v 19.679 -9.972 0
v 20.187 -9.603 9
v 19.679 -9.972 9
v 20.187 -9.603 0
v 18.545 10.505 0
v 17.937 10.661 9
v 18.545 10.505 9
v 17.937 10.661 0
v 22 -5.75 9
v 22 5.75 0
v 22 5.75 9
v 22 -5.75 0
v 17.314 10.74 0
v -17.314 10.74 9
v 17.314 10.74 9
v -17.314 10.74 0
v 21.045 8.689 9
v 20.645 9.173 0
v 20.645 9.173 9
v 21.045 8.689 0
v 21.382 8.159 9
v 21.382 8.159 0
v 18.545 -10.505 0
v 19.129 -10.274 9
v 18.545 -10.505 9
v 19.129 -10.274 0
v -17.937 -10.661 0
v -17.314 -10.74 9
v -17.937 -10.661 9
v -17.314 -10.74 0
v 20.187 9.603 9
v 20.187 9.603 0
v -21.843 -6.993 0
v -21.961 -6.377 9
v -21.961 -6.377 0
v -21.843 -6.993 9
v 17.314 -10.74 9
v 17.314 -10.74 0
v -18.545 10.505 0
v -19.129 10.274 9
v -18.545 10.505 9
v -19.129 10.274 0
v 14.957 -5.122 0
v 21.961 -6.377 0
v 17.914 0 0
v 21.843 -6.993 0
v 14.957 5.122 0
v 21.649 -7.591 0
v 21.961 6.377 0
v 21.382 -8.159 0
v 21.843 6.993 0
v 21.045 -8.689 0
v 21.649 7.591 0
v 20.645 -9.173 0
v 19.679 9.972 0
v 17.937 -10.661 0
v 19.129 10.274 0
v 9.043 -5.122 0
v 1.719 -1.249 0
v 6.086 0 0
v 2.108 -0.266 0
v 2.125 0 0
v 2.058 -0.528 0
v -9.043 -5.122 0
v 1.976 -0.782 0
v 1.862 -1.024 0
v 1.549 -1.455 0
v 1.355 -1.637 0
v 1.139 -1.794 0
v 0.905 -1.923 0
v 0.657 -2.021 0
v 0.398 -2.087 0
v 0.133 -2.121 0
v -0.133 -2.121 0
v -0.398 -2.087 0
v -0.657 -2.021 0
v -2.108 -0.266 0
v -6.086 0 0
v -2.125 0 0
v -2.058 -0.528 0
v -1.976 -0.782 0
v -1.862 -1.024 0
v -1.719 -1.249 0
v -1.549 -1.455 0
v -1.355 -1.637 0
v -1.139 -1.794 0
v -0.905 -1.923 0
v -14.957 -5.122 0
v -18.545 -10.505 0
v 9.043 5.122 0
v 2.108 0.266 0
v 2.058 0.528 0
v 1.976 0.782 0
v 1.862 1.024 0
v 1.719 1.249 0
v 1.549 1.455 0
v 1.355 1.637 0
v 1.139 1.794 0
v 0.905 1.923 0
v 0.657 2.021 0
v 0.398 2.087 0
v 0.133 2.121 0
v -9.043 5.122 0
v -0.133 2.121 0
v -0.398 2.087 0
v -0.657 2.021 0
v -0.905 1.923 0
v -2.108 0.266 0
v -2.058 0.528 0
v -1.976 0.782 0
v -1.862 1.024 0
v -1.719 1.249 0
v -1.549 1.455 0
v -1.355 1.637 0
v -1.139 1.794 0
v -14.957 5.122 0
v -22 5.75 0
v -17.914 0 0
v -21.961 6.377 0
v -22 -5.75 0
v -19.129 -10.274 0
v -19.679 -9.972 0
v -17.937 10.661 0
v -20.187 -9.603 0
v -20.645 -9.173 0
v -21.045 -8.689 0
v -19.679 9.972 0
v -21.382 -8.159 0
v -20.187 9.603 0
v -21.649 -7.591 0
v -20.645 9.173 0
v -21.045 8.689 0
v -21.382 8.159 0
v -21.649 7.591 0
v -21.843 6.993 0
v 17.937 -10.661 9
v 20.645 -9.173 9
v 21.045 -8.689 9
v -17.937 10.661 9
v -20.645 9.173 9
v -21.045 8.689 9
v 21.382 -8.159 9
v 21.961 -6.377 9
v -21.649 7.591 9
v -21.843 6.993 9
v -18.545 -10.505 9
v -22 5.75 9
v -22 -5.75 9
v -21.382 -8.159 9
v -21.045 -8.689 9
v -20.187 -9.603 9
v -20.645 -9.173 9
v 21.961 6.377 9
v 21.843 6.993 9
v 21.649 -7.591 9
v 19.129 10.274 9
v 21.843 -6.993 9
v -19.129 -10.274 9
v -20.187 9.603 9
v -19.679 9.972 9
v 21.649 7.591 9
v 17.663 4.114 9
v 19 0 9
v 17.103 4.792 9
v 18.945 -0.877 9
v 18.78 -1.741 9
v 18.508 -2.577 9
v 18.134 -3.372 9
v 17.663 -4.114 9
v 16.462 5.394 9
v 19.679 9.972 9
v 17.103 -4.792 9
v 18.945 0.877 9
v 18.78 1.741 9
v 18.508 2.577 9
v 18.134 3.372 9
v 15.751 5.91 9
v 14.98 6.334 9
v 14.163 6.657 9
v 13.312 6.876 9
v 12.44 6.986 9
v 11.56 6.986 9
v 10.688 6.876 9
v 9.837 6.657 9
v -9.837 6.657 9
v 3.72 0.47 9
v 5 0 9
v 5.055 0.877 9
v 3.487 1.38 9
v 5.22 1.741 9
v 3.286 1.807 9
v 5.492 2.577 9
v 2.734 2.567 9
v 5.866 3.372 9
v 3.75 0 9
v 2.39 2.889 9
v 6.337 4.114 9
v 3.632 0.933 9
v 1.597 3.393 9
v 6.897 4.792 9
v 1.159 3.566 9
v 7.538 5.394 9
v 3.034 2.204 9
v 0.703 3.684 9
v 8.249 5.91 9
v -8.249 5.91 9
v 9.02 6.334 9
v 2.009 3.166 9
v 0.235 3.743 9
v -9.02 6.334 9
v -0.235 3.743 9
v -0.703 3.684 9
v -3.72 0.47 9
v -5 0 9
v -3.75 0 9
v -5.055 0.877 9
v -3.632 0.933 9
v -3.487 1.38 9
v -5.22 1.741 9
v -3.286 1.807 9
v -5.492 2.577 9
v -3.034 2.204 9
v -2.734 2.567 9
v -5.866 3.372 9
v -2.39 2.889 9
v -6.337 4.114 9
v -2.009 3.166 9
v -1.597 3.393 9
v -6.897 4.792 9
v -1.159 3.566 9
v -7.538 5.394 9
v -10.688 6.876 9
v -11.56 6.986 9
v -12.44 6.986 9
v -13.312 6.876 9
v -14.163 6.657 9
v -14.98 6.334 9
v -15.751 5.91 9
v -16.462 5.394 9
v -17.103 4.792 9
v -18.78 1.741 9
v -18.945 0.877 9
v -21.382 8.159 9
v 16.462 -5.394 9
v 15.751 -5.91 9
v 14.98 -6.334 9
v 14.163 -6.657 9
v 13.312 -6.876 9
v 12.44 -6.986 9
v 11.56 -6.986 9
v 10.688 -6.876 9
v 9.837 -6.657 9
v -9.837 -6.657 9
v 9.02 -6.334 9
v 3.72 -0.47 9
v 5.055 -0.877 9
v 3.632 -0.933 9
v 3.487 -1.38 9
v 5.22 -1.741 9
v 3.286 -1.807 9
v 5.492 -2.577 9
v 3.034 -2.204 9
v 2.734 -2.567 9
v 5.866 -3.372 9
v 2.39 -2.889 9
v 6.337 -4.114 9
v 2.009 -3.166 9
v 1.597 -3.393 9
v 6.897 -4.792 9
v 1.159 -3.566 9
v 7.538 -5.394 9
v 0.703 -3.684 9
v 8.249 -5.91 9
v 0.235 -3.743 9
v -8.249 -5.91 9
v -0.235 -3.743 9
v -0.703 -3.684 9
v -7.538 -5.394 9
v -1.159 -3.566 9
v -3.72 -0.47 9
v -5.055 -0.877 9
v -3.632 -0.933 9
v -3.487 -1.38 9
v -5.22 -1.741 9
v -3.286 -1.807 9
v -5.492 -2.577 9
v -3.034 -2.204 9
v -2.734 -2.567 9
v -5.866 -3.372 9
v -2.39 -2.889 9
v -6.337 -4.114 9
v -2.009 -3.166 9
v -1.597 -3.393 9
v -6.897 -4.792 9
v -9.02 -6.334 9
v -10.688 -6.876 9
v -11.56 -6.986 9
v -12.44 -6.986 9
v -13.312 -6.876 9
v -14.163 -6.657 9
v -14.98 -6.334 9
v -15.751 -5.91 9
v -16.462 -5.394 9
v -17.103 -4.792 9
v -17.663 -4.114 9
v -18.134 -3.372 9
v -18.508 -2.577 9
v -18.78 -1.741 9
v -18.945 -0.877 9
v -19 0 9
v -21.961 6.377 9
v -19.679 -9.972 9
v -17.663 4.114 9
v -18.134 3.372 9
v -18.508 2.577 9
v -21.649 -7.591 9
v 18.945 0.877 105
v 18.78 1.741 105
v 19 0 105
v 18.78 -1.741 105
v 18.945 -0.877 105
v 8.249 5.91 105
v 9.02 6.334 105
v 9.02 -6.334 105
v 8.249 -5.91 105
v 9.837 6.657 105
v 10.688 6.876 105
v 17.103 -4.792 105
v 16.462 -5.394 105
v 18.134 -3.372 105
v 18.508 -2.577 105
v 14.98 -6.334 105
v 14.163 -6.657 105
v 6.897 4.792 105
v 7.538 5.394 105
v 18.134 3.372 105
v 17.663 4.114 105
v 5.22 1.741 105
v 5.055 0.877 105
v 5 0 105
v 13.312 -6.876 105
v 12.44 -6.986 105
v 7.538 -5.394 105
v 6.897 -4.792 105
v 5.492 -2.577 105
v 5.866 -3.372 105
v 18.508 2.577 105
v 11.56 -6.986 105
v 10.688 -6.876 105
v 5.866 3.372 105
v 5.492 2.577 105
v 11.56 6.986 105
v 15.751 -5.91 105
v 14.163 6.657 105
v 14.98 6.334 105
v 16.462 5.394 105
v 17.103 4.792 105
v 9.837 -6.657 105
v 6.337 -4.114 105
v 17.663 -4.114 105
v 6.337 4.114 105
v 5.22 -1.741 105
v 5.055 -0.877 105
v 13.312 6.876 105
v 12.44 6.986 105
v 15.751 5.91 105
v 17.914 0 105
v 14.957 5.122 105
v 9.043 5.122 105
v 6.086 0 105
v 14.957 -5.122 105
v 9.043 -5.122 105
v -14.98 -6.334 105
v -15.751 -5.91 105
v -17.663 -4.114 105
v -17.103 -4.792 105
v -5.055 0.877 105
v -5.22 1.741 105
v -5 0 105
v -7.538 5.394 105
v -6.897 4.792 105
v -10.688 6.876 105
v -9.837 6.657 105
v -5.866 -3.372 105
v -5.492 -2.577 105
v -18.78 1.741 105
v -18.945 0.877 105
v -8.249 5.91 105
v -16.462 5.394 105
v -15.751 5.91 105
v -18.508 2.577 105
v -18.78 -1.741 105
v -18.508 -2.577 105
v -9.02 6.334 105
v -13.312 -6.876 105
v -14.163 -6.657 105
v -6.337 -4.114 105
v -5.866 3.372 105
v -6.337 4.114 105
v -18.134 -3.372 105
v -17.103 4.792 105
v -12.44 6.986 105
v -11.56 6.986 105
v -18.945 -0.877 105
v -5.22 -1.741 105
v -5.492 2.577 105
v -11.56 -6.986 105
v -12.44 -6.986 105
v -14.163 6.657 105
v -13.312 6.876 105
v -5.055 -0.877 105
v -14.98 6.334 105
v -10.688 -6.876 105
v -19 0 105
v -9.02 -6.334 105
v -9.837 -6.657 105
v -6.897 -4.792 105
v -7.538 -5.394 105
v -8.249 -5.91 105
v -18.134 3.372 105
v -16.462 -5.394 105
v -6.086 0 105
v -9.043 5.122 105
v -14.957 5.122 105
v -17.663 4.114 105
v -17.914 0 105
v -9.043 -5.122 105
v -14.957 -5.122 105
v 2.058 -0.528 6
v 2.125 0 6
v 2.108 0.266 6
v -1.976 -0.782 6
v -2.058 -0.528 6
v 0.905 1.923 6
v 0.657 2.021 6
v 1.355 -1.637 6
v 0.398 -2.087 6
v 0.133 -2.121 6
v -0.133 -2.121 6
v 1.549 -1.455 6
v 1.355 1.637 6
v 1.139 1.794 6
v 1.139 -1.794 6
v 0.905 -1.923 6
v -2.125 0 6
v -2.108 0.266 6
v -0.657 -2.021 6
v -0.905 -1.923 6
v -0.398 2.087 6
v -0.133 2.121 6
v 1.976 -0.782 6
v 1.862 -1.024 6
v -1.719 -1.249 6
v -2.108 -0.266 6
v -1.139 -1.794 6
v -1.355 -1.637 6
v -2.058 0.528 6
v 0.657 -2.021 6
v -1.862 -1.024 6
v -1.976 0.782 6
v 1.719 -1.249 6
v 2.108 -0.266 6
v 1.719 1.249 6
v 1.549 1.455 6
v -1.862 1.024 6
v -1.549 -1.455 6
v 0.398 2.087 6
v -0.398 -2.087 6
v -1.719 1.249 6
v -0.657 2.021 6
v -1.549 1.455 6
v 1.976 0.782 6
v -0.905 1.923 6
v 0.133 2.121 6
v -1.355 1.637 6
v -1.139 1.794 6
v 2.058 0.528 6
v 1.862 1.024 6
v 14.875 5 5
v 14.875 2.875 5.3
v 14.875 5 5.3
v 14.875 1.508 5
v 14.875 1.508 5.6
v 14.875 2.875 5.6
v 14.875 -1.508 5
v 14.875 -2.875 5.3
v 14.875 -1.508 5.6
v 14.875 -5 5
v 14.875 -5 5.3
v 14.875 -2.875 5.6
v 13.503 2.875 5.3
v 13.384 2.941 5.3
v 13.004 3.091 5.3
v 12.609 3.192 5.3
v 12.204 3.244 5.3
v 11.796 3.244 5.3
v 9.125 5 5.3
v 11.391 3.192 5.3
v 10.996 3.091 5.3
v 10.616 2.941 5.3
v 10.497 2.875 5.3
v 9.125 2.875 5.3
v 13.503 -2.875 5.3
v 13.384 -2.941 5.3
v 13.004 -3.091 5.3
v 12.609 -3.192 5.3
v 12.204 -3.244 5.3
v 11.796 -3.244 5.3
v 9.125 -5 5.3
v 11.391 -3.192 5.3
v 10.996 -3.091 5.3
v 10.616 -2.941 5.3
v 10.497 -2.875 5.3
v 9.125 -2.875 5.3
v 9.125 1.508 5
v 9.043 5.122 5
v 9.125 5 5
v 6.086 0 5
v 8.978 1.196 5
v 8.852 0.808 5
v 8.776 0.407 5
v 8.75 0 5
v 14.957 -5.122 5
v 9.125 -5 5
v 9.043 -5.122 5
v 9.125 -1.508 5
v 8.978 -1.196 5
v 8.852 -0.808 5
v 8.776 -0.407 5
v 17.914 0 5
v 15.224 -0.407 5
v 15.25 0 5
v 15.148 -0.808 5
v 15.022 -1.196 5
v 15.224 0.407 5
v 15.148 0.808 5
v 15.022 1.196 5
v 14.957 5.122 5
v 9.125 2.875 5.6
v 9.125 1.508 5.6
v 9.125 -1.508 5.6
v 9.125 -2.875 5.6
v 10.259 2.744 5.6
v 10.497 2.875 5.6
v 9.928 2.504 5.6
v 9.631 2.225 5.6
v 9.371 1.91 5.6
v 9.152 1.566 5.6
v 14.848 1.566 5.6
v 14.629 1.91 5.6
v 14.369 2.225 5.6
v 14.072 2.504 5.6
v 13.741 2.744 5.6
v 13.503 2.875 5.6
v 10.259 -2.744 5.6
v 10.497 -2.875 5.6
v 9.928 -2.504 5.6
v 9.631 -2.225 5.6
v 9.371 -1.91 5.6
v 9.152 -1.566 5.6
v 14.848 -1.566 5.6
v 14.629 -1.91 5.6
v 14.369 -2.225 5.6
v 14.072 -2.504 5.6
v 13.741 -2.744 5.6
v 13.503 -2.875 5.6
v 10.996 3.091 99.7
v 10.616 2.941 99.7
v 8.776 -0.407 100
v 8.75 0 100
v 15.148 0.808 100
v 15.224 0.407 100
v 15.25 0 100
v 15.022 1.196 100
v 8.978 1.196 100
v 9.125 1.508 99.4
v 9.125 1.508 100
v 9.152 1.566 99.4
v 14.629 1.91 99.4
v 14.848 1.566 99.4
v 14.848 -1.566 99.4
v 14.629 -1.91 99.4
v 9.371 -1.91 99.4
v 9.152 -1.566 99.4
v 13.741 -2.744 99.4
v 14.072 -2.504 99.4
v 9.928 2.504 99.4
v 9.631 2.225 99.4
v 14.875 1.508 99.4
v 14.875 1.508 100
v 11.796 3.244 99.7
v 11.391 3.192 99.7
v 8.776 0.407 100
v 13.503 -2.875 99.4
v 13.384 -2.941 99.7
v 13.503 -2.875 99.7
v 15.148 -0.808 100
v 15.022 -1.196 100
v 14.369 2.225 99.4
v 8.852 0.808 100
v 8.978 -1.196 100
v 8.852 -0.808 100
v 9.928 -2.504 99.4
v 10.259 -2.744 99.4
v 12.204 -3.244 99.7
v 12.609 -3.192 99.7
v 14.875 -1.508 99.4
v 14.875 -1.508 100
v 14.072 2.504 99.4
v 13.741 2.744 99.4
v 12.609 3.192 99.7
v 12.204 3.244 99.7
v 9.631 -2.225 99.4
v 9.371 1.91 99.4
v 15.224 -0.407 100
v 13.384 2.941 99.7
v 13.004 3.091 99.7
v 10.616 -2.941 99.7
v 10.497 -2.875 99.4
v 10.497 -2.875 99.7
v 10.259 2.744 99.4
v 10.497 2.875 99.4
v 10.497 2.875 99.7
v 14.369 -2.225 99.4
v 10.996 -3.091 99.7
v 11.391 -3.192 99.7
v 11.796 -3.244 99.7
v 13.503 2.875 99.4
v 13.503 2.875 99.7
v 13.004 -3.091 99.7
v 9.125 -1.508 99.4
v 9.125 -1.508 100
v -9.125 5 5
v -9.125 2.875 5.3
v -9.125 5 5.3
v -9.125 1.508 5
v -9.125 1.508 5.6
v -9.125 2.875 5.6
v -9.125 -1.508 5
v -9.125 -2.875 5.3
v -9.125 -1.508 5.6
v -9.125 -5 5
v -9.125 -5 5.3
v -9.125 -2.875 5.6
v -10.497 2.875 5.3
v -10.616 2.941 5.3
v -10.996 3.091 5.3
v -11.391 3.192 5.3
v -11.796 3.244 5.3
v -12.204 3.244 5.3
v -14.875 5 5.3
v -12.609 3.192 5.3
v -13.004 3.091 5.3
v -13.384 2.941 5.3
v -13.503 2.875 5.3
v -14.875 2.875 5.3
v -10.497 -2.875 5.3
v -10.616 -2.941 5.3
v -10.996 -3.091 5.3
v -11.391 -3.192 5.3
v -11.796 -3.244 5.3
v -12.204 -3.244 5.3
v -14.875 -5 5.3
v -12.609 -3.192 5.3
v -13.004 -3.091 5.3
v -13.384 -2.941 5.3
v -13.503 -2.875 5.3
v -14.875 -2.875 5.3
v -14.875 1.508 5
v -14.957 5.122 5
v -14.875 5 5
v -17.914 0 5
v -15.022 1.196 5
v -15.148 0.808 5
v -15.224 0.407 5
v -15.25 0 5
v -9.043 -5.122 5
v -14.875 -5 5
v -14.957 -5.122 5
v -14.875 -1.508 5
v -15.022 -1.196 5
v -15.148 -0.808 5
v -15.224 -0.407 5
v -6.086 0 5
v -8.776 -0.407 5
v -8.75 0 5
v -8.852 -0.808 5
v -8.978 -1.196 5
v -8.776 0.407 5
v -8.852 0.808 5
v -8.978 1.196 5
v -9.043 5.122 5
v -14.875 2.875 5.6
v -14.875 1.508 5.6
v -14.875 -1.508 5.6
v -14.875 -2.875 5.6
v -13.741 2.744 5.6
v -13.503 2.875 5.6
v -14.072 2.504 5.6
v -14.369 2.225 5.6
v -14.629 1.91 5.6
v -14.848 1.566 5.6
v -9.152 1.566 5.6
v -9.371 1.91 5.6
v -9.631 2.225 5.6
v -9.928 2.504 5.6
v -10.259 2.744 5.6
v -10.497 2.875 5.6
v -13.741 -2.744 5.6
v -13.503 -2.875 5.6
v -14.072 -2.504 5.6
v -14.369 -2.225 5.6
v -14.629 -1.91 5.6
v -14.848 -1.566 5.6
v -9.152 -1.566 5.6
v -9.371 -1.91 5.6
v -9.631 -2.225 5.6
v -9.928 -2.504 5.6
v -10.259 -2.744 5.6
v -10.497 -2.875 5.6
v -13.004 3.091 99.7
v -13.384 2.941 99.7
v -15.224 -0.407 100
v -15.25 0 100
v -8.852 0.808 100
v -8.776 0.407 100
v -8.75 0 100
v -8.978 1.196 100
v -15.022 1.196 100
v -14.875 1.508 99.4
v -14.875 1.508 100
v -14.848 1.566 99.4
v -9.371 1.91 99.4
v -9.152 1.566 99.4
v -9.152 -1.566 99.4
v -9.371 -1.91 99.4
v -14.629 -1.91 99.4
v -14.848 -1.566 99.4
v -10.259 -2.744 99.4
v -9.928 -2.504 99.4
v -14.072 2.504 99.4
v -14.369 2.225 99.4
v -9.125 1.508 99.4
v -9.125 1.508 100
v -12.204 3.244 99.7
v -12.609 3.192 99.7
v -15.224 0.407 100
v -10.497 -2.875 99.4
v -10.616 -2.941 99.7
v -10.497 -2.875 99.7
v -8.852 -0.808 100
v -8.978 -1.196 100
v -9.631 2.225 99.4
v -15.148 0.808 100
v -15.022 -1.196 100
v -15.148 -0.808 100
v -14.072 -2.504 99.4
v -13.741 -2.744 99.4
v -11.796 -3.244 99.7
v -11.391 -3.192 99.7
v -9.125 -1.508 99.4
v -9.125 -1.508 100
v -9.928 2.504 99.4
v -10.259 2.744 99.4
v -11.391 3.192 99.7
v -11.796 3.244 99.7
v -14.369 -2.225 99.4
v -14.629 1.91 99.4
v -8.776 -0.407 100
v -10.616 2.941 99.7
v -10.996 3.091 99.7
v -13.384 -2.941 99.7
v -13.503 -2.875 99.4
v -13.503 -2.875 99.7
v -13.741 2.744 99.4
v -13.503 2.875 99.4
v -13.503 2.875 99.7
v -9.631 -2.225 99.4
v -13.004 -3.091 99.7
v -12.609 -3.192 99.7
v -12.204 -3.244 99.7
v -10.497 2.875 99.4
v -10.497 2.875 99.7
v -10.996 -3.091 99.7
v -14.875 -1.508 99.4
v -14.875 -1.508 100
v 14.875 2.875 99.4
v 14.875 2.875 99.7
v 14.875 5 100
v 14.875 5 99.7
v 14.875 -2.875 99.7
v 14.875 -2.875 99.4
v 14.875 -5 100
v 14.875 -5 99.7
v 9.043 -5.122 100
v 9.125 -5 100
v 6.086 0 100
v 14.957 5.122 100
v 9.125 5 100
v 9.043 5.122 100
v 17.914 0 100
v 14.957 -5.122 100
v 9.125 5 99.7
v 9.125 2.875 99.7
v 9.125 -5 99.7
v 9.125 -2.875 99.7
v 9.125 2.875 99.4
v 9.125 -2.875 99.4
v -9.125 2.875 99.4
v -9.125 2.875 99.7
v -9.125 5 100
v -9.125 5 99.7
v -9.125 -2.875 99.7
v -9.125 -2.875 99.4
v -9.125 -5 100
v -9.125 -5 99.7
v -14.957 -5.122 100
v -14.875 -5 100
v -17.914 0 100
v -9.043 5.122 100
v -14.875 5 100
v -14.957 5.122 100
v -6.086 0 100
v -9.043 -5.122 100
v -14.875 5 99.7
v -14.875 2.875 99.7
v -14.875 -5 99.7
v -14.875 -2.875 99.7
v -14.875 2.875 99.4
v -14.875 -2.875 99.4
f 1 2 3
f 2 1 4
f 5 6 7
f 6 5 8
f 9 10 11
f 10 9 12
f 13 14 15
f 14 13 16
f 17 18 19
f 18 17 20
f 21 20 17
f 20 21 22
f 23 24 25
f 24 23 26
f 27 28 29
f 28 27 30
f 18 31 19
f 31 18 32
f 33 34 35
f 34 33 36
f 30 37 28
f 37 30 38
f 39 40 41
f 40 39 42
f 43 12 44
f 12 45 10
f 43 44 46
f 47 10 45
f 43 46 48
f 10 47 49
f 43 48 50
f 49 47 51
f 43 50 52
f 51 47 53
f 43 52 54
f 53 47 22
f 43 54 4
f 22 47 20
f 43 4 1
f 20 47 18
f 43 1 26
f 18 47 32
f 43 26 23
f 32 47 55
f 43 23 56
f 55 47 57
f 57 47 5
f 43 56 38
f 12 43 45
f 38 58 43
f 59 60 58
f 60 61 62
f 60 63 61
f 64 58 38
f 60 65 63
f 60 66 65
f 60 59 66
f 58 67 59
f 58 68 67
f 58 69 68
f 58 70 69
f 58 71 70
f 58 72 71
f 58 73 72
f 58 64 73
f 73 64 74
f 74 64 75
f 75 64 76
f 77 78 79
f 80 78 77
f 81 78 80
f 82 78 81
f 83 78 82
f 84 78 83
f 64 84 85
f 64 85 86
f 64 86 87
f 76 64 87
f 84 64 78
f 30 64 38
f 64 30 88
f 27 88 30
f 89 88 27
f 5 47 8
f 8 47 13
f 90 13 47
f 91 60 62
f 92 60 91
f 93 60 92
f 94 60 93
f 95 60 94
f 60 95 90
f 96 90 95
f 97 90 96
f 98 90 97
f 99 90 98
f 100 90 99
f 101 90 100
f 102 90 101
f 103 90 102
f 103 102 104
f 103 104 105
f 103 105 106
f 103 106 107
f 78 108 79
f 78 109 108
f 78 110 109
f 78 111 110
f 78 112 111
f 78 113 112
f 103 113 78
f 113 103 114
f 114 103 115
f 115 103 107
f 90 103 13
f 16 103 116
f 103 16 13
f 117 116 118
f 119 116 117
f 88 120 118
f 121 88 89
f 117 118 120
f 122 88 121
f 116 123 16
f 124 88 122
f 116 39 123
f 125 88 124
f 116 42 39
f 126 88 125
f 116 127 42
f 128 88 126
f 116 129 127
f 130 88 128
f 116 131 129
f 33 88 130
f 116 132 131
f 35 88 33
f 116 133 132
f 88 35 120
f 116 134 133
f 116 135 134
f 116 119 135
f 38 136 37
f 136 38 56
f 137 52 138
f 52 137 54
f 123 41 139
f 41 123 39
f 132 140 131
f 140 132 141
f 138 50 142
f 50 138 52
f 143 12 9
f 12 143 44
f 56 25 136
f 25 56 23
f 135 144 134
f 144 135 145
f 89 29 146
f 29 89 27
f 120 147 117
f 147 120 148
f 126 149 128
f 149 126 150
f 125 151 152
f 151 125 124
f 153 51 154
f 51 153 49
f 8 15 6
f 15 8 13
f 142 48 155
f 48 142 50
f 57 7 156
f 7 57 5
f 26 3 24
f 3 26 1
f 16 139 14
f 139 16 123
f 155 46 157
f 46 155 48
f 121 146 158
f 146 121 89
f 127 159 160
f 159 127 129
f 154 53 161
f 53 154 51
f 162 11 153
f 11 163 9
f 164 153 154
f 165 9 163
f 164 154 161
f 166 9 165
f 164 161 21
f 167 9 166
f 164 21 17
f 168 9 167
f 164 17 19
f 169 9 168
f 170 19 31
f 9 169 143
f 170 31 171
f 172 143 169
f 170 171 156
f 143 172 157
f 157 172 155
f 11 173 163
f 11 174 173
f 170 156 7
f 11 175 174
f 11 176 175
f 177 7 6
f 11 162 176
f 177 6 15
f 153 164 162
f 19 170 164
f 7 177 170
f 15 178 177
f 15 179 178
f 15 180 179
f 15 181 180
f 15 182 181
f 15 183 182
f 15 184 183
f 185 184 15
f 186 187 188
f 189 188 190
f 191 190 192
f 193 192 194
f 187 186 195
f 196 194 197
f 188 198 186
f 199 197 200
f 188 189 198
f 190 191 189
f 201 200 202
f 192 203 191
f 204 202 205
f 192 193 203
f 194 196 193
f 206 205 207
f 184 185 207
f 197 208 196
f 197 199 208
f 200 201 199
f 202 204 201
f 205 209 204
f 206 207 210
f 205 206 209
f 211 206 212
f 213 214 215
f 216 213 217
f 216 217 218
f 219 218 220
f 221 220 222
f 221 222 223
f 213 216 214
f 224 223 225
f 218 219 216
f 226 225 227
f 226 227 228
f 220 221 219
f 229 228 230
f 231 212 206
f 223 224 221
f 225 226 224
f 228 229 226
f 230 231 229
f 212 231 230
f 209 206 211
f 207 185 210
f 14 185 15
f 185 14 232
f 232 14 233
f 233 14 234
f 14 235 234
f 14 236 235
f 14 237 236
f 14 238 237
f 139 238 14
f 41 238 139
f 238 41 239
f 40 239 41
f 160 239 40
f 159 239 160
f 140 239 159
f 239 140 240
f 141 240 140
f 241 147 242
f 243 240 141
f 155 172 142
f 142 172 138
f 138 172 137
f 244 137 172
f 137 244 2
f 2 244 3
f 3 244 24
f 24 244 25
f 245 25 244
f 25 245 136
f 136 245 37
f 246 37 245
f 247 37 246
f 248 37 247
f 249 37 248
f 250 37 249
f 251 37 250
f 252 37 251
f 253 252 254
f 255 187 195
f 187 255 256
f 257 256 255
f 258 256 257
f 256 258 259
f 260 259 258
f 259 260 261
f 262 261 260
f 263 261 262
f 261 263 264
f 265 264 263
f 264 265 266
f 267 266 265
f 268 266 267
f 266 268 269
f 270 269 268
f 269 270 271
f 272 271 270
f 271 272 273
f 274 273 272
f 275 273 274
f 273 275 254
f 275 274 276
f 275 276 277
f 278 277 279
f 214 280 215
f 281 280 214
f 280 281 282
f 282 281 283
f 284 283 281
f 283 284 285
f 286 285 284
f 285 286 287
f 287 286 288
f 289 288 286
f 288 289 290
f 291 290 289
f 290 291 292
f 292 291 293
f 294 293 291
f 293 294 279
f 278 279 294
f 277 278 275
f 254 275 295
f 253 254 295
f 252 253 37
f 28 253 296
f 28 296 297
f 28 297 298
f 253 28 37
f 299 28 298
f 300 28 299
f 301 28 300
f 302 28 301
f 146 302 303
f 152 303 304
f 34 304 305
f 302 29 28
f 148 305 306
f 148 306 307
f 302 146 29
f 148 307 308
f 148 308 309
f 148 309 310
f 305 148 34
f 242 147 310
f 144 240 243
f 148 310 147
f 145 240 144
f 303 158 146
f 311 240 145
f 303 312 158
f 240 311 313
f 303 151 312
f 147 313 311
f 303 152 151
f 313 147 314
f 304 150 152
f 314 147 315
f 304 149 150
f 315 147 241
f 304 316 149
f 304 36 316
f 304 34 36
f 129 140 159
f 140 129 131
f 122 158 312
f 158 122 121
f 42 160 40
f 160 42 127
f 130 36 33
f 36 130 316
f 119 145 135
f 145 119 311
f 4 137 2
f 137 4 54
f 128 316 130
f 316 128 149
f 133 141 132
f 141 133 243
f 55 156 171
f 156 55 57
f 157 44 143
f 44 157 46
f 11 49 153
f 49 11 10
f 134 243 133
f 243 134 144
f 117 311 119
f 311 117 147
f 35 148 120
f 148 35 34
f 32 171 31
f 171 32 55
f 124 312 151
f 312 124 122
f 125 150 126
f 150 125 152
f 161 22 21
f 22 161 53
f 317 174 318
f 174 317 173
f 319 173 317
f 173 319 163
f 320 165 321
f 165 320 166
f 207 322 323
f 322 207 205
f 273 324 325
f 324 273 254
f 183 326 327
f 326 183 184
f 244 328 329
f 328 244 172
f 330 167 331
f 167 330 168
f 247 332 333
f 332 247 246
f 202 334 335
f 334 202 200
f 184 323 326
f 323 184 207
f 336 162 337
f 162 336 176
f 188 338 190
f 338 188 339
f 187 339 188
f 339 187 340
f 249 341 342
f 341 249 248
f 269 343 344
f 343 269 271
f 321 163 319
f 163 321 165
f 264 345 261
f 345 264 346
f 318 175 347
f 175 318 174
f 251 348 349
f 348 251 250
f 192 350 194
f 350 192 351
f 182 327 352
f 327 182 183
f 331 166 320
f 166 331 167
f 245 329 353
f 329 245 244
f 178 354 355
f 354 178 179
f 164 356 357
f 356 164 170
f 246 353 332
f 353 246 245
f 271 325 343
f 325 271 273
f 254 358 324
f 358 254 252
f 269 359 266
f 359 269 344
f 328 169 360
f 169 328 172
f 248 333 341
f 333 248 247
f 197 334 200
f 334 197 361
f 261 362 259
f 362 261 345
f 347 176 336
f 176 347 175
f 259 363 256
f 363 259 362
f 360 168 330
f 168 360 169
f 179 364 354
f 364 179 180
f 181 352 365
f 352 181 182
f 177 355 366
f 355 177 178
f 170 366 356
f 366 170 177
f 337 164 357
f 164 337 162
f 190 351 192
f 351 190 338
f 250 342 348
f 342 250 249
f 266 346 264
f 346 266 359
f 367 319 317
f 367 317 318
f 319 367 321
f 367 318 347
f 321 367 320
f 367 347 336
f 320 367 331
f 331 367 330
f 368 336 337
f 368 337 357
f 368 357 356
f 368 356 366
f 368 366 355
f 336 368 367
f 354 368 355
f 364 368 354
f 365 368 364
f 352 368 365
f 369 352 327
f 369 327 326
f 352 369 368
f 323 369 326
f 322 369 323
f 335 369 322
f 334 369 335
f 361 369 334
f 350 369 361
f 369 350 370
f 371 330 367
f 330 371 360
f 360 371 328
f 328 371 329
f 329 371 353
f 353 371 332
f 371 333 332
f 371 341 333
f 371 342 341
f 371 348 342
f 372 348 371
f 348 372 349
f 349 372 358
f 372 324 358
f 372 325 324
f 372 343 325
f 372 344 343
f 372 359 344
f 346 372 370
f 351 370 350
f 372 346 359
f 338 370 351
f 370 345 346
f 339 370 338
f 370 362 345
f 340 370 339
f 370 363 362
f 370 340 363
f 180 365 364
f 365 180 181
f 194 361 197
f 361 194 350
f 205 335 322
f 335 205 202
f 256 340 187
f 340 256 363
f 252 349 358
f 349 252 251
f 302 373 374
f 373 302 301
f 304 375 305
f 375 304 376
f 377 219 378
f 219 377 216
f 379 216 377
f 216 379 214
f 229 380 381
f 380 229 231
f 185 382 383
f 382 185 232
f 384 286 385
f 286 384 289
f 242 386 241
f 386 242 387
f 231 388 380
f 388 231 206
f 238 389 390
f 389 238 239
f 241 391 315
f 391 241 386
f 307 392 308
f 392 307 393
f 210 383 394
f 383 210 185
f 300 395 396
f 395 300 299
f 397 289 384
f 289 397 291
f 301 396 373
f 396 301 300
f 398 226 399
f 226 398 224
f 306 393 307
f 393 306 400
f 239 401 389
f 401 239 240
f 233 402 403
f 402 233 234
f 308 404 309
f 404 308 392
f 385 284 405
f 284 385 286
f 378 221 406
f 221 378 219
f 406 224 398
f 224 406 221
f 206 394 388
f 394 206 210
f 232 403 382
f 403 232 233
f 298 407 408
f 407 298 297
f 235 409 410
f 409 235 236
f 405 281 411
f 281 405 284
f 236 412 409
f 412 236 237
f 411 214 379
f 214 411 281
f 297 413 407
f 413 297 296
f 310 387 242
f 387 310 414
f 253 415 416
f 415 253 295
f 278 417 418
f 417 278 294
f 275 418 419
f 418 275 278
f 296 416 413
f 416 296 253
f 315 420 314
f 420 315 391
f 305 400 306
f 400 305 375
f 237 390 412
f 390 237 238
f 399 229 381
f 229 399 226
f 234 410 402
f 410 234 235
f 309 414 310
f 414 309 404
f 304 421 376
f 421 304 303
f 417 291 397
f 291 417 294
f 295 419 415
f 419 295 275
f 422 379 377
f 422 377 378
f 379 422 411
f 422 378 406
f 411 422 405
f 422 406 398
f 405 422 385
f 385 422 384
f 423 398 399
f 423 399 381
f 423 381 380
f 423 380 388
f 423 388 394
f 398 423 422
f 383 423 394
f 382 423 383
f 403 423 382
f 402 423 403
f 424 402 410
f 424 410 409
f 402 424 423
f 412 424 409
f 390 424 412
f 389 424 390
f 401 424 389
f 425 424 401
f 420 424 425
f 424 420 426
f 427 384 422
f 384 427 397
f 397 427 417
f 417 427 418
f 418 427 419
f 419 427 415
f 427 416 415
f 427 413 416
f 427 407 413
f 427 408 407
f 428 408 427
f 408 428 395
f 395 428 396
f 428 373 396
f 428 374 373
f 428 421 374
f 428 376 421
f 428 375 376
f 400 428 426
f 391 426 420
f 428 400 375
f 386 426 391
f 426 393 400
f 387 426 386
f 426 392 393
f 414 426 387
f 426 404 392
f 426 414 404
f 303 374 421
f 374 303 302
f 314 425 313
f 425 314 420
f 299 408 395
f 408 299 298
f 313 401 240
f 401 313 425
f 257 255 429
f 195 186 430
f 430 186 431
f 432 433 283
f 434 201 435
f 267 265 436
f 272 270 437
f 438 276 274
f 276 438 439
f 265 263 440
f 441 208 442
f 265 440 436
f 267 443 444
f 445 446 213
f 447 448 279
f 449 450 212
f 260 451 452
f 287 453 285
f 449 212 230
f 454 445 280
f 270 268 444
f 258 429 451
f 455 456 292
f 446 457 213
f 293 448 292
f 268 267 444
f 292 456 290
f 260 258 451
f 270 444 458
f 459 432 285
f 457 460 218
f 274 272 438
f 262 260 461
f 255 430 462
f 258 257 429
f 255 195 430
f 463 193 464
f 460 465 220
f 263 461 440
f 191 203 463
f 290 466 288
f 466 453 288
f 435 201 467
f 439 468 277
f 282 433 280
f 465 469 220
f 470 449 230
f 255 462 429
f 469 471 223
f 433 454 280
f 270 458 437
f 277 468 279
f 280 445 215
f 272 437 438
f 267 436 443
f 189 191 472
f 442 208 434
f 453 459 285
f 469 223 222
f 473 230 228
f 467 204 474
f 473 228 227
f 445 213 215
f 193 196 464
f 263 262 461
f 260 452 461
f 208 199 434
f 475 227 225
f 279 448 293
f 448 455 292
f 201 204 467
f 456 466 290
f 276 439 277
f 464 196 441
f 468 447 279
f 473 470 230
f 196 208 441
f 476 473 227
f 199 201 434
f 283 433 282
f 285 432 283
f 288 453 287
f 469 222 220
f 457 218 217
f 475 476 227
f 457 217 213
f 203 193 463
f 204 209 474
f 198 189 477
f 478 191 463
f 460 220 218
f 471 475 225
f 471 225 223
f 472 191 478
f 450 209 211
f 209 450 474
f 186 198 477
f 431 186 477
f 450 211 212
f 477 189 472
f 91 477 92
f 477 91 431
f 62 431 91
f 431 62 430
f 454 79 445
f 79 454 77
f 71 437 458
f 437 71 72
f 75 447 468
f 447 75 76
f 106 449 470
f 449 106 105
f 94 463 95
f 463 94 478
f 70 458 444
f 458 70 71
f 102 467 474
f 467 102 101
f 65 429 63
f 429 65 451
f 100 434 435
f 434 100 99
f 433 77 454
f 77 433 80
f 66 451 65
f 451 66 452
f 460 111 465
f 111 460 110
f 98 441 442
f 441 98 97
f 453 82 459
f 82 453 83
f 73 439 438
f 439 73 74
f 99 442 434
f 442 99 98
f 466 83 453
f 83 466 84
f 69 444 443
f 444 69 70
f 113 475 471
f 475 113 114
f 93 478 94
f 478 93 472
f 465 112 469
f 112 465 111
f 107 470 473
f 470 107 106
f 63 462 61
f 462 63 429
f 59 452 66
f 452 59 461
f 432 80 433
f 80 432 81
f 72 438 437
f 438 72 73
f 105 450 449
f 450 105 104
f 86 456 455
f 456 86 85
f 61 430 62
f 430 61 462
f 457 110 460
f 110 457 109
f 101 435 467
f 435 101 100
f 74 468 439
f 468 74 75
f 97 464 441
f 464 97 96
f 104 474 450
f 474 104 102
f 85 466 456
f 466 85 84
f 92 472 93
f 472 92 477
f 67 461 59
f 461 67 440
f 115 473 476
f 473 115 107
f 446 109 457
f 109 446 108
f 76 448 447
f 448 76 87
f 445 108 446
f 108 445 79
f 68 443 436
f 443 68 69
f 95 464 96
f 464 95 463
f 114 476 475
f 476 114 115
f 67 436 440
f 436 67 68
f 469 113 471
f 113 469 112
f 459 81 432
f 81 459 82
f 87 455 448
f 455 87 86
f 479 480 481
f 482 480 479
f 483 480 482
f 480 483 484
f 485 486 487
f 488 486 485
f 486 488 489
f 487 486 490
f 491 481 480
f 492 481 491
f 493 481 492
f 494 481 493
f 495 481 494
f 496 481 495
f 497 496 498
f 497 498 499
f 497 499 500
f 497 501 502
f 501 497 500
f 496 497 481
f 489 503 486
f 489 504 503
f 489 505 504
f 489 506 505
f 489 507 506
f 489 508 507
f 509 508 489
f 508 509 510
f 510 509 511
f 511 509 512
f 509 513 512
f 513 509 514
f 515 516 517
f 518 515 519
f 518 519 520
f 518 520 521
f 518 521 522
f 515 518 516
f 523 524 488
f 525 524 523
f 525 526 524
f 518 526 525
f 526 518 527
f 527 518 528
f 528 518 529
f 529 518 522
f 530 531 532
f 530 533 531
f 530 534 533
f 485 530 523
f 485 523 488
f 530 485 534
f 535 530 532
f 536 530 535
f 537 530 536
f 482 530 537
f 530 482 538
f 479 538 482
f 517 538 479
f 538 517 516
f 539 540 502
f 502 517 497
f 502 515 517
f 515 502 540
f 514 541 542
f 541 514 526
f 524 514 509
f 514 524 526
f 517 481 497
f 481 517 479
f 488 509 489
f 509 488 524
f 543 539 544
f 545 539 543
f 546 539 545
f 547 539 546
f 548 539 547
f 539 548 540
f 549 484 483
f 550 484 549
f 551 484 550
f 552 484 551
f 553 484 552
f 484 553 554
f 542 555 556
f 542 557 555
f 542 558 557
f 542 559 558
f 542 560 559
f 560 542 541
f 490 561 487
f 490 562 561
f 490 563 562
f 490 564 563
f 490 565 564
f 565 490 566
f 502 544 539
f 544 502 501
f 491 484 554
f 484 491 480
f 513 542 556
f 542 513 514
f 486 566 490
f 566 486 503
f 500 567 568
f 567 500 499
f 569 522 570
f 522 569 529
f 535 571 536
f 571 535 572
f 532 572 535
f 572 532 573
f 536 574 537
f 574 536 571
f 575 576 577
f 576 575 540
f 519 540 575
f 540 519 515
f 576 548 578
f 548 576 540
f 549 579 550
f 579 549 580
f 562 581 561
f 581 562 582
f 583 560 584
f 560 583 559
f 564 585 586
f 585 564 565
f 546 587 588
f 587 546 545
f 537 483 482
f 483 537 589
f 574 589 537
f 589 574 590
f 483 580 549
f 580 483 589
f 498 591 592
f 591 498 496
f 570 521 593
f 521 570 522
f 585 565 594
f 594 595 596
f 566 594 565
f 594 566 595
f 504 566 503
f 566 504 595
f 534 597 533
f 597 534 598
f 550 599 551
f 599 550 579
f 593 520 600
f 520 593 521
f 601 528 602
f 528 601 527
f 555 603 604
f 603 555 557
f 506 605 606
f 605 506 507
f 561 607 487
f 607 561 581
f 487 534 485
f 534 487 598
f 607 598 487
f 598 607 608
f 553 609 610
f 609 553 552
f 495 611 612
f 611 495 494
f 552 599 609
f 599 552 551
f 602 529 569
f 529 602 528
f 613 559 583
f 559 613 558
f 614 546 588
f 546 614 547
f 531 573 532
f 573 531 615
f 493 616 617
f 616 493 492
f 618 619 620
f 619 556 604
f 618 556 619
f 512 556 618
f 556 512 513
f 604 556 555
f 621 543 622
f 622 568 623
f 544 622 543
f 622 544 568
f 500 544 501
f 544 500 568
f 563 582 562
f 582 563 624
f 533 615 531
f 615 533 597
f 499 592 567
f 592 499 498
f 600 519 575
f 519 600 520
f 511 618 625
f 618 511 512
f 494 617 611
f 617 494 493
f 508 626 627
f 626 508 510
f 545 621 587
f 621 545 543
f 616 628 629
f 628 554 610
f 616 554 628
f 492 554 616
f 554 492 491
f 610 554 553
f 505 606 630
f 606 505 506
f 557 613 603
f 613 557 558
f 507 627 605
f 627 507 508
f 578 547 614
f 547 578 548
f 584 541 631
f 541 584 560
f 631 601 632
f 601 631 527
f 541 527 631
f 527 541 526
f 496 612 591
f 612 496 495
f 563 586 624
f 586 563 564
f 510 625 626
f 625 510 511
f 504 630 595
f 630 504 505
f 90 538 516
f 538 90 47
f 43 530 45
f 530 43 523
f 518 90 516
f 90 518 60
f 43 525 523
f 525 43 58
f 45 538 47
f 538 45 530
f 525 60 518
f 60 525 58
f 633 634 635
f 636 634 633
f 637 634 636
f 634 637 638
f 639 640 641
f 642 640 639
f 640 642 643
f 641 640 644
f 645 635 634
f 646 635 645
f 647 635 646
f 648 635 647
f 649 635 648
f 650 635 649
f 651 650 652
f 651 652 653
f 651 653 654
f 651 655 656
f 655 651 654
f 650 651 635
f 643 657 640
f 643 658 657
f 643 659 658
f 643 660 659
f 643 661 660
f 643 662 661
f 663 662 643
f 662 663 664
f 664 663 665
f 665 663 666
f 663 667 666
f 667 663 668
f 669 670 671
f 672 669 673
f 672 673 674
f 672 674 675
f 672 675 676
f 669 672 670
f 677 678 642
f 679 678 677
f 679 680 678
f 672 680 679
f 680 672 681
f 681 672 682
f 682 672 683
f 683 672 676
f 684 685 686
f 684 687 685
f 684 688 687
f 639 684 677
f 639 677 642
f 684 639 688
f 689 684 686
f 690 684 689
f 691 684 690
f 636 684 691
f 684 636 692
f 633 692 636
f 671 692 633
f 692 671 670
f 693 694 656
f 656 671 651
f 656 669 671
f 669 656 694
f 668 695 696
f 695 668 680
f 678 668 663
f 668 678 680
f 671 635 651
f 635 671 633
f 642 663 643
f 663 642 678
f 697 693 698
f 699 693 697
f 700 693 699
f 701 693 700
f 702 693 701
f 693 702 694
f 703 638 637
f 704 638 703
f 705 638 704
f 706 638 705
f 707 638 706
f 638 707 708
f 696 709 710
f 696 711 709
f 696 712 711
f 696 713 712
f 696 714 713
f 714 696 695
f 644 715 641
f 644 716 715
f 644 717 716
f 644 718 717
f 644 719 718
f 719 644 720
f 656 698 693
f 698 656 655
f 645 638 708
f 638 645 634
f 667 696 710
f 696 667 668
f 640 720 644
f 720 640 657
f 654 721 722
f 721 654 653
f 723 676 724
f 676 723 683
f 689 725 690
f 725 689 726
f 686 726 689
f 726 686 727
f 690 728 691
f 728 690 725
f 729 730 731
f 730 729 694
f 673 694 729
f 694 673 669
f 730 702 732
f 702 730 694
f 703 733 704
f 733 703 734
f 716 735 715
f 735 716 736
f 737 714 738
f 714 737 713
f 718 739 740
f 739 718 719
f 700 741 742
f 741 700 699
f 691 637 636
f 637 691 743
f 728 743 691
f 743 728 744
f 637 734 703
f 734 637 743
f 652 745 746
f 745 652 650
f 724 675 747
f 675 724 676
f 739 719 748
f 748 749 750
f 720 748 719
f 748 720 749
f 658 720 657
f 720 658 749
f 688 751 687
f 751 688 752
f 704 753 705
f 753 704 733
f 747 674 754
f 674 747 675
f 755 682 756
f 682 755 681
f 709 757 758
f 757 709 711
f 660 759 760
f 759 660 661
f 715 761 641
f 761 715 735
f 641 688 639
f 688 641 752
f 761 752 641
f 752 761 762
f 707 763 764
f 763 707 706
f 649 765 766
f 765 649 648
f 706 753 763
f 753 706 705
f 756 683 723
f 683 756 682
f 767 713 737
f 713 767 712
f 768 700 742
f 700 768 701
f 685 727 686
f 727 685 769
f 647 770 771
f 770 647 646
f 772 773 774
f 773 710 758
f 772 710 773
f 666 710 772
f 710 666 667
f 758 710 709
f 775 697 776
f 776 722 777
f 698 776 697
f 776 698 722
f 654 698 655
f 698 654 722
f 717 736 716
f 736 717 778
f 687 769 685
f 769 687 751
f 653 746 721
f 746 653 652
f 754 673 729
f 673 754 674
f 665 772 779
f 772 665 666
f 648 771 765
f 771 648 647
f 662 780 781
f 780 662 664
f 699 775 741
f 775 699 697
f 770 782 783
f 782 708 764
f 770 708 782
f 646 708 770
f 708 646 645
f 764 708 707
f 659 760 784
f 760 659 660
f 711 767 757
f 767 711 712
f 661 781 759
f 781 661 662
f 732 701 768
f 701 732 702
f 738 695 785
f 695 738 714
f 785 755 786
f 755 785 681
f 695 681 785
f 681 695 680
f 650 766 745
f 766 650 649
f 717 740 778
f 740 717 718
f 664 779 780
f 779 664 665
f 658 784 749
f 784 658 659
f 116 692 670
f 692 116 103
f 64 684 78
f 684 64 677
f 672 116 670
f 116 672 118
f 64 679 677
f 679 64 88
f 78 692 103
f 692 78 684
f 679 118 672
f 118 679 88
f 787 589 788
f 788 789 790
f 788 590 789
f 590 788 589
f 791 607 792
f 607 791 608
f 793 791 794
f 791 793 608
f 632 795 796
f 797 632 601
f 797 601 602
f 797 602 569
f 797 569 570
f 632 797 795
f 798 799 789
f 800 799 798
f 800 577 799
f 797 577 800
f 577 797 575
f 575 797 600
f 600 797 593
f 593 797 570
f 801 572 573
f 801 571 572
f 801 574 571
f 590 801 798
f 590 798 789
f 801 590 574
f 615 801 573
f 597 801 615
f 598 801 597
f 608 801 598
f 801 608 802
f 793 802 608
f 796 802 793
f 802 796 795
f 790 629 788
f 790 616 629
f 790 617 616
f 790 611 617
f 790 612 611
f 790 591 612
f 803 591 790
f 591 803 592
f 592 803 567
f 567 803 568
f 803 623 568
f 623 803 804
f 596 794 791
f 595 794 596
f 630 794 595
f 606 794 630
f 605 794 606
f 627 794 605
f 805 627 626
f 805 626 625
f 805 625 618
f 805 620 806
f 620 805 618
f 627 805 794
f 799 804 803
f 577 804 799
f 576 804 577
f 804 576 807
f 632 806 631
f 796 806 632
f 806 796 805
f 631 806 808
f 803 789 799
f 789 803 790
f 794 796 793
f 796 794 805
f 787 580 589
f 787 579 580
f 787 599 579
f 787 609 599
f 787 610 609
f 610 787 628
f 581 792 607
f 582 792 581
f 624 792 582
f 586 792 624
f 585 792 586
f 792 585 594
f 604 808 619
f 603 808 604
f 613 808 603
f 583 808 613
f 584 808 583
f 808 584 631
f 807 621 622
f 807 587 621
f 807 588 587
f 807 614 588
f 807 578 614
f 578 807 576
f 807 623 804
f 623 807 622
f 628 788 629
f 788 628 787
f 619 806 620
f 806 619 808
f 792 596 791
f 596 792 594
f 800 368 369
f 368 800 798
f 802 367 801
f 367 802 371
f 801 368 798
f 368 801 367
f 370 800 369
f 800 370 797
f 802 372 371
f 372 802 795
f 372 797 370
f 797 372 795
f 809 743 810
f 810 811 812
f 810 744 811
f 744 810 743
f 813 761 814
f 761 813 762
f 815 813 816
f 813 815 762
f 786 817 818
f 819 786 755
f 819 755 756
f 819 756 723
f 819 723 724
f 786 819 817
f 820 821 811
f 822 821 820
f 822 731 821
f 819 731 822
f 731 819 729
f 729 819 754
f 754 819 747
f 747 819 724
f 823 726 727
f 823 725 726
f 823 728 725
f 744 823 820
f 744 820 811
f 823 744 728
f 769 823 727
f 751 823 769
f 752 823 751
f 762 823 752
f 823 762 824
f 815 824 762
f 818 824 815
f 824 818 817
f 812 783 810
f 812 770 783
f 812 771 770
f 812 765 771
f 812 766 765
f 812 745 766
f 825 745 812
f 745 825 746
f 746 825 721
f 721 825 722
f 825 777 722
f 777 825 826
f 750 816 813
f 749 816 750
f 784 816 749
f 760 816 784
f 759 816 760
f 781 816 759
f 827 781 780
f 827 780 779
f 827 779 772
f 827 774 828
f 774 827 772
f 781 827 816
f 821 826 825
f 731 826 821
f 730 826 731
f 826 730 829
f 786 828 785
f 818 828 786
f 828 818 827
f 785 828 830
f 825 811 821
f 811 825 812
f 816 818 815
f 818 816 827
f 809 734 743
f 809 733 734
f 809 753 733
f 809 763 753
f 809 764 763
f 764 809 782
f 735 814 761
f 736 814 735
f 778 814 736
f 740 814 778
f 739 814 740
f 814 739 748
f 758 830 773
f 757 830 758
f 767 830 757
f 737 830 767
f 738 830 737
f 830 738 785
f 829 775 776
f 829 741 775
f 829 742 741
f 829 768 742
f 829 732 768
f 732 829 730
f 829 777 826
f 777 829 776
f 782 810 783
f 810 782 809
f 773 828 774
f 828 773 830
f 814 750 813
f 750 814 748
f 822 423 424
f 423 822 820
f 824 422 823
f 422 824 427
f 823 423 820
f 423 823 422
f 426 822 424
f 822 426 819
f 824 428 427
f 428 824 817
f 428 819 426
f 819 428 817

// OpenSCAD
$fn = 50;


difference() {
	union() {
		hull() {
			translate(v = [-17.0000000000, 5.7500000000, 0]) {
				cylinder(h = 9, r = 5);
			}
			translate(v = [17.0000000000, 5.7500000000, 0]) {
				cylinder(h = 9, r = 5);
			}
			translate(v = [-17.0000000000, -5.7500000000, 0]) {
				cylinder(h = 9, r = 5);
			}
			translate(v = [17.0000000000, -5.7500000000, 0]) {
				cylinder(h = 9, r = 5);
			}
		}
		translate(v = [12.0000000000, 0, 0.0000000000]) {
			cylinder(h = 105, r = 7.0000000000);
		}
		translate(v = [-12.0000000000, 0, 0.0000000000]) {
			cylinder(h = 105, r = 7.0000000000);
		}
		translate(v = [12.0000000000, 0, 99.0000000000]) {
			cylinder(h = 6, r = 7.0000000000);
		}
		translate(v = [-12.0000000000, 0, 99.0000000000]) {
			cylinder(h = 6, r = 7.0000000000);
		}
	}
	union() {
		translate(v = [0, 0, 9]) {
			rotate(a = [0, 0, 0]) {
				difference() {
					union() {
						#translate(v = [0, 0, -100.0000000000]) {
							cylinder(h = 100, r = 2.0000000000);
						}
						#translate(v = [0, 0, -3]) {
							cylinder(h = 3, r1 = 2.1250000000, r2 = 3.7500000000);
						}
						#translate(v = [0, 0, -100.0000000000]) {
							cylinder(h = 100, r = 2.1250000000);
						}
						#translate(v = [0, 0, -100.0000000000]) {
							cylinder(h = 100, r = 2.0000000000);
						}
					}
					union();
				}
			}
		}
		translate(v = [12.0000000000, 0, 0]) {
			rotate(a = [0, 0, 0]) {
				difference() {
					union() {
						#translate(v = [-2.8750000000, -5.0000000000, -0.3000000000]) {
							cube(size = [5.7500000000, 10, 0.3000000000]);
						}
						#translate(v = [-2.8750000000, -2.8750000000, -0.6000000000]) {
							cube(size = [5.7500000000, 5.7500000000, 0.3000000000]);
						}
						#translate(v = [-2.8750000000, -5.0000000000, 5]) {
							cube(size = [5.7500000000, 10, 0.3000000000]);
						}
						#translate(v = [-2.8750000000, -2.8750000000, 5.3000000000]) {
							cube(size = [5.7500000000, 5.7500000000, 0.3000000000]);
						}
						#translate(v = [0, 0, -100.0000000000]) {
							cylinder(h = 200, r = 3.2500000000);
						}
						#linear_extrude(height = 5) {
							polygon(points = [[5.9142500000, 0.0000000000], [2.9571250000, 5.1218907443], [-2.9571250000, 5.1218907443], [-5.9142500000, 0.0000000000], [-2.9571250000, -5.1218907443], [2.9571250000, -5.1218907443]]);
						}
						#translate(v = [-2.8750000000, -5.0000000000, -0.3000000000]) {
							cube(size = [5.7500000000, 10, 0.3000000000]);
						}
						#translate(v = [-2.8750000000, -2.8750000000, -0.6000000000]) {
							cube(size = [5.7500000000, 5.7500000000, 0.3000000000]);
						}
						#translate(v = [-2.8750000000, -5.0000000000, 5]) {
							cube(size = [5.7500000000, 10, 0.3000000000]);
						}
						#translate(v = [-2.8750000000, -2.8750000000, 5.3000000000]) {
							cube(size = [5.7500000000, 5.7500000000, 0.3000000000]);
						}
						#translate(v = [0, 0, -100.0000000000]) {
							cylinder(h = 200, r = 3.2500000000);
						}
						#translate(v = [-2.8750000000, -5.0000000000, -0.3000000000]) {
							cube(size = [5.7500000000, 10, 0.3000000000]);
						}
						#translate(v = [-2.8750000000, -2.8750000000, -0.6000000000]) {
							cube(size = [5.7500000000, 5.7500000000, 0.3000000000]);
						}
						#translate(v = [-2.8750000000, -5.0000000000, 5]) {
							cube(size = [5.7500000000, 10, 0.3000000000]);
						}
						#translate(v = [-2.8750000000, -2.8750000000, 5.3000000000]) {
							cube(size = [5.7500000000, 5.7500000000, 0.3000000000]);
						}
						#translate(v = [0, 0, -100.0000000000]) {
							cylinder(h = 200, r = 3.2500000000);
						}
					}
					union();
				}
			}
		}
		translate(v = [-12.0000000000, 0, 0]) {
			rotate(a = [0, 0, 0]) {
				difference() {
					union() {
						#translate(v = [-2.8750000000, -5.0000000000, -0.3000000000]) {
							cube(size = [5.7500000000, 10, 0.3000000000]);
						}
						#translate(v = [-2.8750000000, -2.8750000000, -0.6000000000]) {
							cube(size = [5.7500000000, 5.7500000000, 0.3000000000]);
						}
						#translate(v = [-2.8750000000, -5.0000000000, 5]) {
							cube(size = [5.7500000000, 10, 0.3000000000]);
						}
						#translate(v = [-2.8750000000, -2.8750000000, 5.3000000000]) {
							cube(size = [5.7500000000, 5.7500000000, 0.3000000000]);
						}
						#translate(v = [0, 0, -100.0000000000]) {
							cylinder(h = 200, r = 3.2500000000);
						}
						#linear_extrude(height = 5) {
							polygon(points = [[5.9142500000, 0.0000000000], [2.9571250000, 5.1218907443], [-2.9571250000, 5.1218907443], [-5.9142500000, 0.0000000000], [-2.9571250000, -5.1218907443], [2.9571250000, -5.1218907443]]);
						}
						#translate(v = [-2.8750000000, -5.0000000000, -0.3000000000]) {
							cube(size = [5.7500000000, 10, 0.3000000000]);
						}
						#translate(v = [-2.8750000000, -2.8750000000, -0.6000000000]) {
							cube(size = [5.7500000000, 5.7500000000, 0.3000000000]);
						}
						#translate(v = [-2.8750000000, -5.0000000000, 5]) {
							cube(size = [5.7500000000, 10, 0.3000000000]);
						}
						#translate(v = [-2.8750000000, -2.8750000000, 5.3000000000]) {
							cube(size = [5.7500000000, 5.7500000000, 0.3000000000]);
						}
						#translate(v = [0, 0, -100.0000000000]) {
							cylinder(h = 200, r = 3.2500000000);
						}
						#translate(v = [-2.8750000000, -5.0000000000, -0.3000000000]) {
							cube(size = [5.7500000000, 10, 0.3000000000]);
						}
						#translate(v = [-2.8750000000, -2.8750000000, -0.6000000000]) {
							cube(size = [5.7500000000, 5.7500000000, 0.3000000000]);
						}
						#translate(v = [-2.8750000000, -5.0000000000, 5]) {
							cube(size = [5.7500000000, 10, 0.3000000000]);
						}
						#translate(v = [-2.8750000000, -2.8750000000, 5.3000000000]) {
							cube(size = [5.7500000000, 5.7500000000, 0.3000000000]);
						}
						#translate(v = [0, 0, -100.0000000000]) {
							cylinder(h = 200, r = 3.2500000000);
						}
					}
					union();
				}
			}
		}
		translate(v = [12.0000000000, 0, 105]) {
			rotate(a = [0, 0, 0]) {
				difference() {
					union() {
						#translate(v = [-2.8750000000, -5.0000000000, -5.3000000000]) {
							cube(size = [5.7500000000, 10, 0.3000000000]);
						}
						#translate(v = [-2.8750000000, -2.8750000000, -5.6000000000]) {
							cube(size = [5.7500000000, 5.7500000000, 0.3000000000]);
						}
						#translate(v = [-2.8750000000, -5.0000000000, 0]) {
							cube(size = [5.7500000000, 10, 0.3000000000]);
						}
						#translate(v = [-2.8750000000, -2.8750000000, 0.3000000000]) {
							cube(size = [5.7500000000, 5.7500000000, 0.3000000000]);
						}
						#translate(v = [0, 0, -100.0000000000]) {
							cylinder(h = 200, r = 3.2500000000);
						}
						translate(v = [0, 0, -5]) {
							#linear_extrude(height = 5) {
								polygon(points = [[5.9142500000, 0.0000000000], [2.9571250000, 5.1218907443], [-2.9571250000, 5.1218907443], [-5.9142500000, 0.0000000000], [-2.9571250000, -5.1218907443], [2.9571250000, -5.1218907443]]);
							}
						}
						#translate(v = [-2.8750000000, -5.0000000000, -5.3000000000]) {
							cube(size = [5.7500000000, 10, 0.3000000000]);
						}
						#translate(v = [-2.8750000000, -2.8750000000, -5.6000000000]) {
							cube(size = [5.7500000000, 5.7500000000, 0.3000000000]);
						}
						#translate(v = [-2.8750000000, -5.0000000000, 0]) {
							cube(size = [5.7500000000, 10, 0.3000000000]);
						}
						#translate(v = [-2.8750000000, -2.8750000000, 0.3000000000]) {
							cube(size = [5.7500000000, 5.7500000000, 0.3000000000]);
						}
						#translate(v = [0, 0, -100.0000000000]) {
							cylinder(h = 200, r = 3.2500000000);
						}
						#translate(v = [-2.8750000000, -5.0000000000, -5.3000000000]) {
							cube(size = [5.7500000000, 10, 0.3000000000]);
						}
						#translate(v = [-2.8750000000, -2.8750000000, -5.6000000000]) {
							cube(size = [5.7500000000, 5.7500000000, 0.3000000000]);
						}
						#translate(v = [-2.8750000000, -5.0000000000, 0]) {
							cube(size = [5.7500000000, 10, 0.3000000000]);
						}
						#translate(v = [-2.8750000000, -2.8750000000, 0.3000000000]) {
							cube(size = [5.7500000000, 5.7500000000, 0.3000000000]);
						}
						#translate(v = [0, 0, -100.0000000000]) {
							cylinder(h = 200, r = 3.2500000000);
						}
					}
					union();
				}
			}
		}
		translate(v = [-12.0000000000, 0, 105]) {
			rotate(a = [0, 0, 0]) {
				difference() {
					union() {
						#translate(v = [-2.8750000000, -5.0000000000, -5.3000000000]) {
							cube(size = [5.7500000000, 10, 0.3000000000]);
						}
						#translate(v = [-2.8750000000, -2.8750000000, -5.6000000000]) {
							cube(size = [5.7500000000, 5.7500000000, 0.3000000000]);
						}
						#translate(v = [-2.8750000000, -5.0000000000, 0]) {
							cube(size = [5.7500000000, 10, 0.3000000000]);
						}
						#translate(v = [-2.8750000000, -2.8750000000, 0.3000000000]) {
							cube(size = [5.7500000000, 5.7500000000, 0.3000000000]);
						}
						#translate(v = [0, 0, -100.0000000000]) {
							cylinder(h = 200, r = 3.2500000000);
						}
						translate(v = [0, 0, -5]) {
							#linear_extrude(height = 5) {
								polygon(points = [[5.9142500000, 0.0000000000], [2.9571250000, 5.1218907443], [-2.9571250000, 5.1218907443], [-5.9142500000, 0.0000000000], [-2.9571250000, -5.1218907443], [2.9571250000, -5.1218907443]]);
							}
						}
						#translate(v = [-2.8750000000, -5.0000000000, -5.3000000000]) {
							cube(size = [5.7500000000, 10, 0.3000000000]);
						}
						#translate(v = [-2.8750000000, -2.8750000000, -5.6000000000]) {
							cube(size = [5.7500000000, 5.7500000000, 0.3000000000]);
						}
						#translate(v = [-2.8750000000, -5.0000000000, 0]) {
							cube(size = [5.7500000000, 10, 0.3000000000]);
						}
						#translate(v = [-2.8750000000, -2.8750000000, 0.3000000000]) {
							cube(size = [5.7500000000, 5.7500000000, 0.3000000000]);
						}
						#translate(v = [0, 0, -100.0000000000]) {
							cylinder(h = 200, r = 3.2500000000);
						}
						#translate(v = [-2.8750000000, -5.0000000000, -5.3000000000]) {
							cube(size = [5.7500000000, 10, 0.3000000000]);
						}
						#translate(v = [-2.8750000000, -2.8750000000, -5.6000000000]) {
							cube(size = [5.7500000000, 5.7500000000, 0.3000000000]);
						}
						#translate(v = [-2.8750000000, -5.0000000000, 0]) {
							cube(size = [5.7500000000, 10, 0.3000000000]);
						}
						#translate(v = [-2.8750000000, -2.8750000000, 0.3000000000]) {
							cube(size = [5.7500000000, 5.7500000000, 0.3000000000]);
						}
						#translate(v = [0, 0, -100.0000000000]) {
							cylinder(h = 200, r = 3.2500000000);
						}
					}
					union();
				}
			}
		}
	}
}
